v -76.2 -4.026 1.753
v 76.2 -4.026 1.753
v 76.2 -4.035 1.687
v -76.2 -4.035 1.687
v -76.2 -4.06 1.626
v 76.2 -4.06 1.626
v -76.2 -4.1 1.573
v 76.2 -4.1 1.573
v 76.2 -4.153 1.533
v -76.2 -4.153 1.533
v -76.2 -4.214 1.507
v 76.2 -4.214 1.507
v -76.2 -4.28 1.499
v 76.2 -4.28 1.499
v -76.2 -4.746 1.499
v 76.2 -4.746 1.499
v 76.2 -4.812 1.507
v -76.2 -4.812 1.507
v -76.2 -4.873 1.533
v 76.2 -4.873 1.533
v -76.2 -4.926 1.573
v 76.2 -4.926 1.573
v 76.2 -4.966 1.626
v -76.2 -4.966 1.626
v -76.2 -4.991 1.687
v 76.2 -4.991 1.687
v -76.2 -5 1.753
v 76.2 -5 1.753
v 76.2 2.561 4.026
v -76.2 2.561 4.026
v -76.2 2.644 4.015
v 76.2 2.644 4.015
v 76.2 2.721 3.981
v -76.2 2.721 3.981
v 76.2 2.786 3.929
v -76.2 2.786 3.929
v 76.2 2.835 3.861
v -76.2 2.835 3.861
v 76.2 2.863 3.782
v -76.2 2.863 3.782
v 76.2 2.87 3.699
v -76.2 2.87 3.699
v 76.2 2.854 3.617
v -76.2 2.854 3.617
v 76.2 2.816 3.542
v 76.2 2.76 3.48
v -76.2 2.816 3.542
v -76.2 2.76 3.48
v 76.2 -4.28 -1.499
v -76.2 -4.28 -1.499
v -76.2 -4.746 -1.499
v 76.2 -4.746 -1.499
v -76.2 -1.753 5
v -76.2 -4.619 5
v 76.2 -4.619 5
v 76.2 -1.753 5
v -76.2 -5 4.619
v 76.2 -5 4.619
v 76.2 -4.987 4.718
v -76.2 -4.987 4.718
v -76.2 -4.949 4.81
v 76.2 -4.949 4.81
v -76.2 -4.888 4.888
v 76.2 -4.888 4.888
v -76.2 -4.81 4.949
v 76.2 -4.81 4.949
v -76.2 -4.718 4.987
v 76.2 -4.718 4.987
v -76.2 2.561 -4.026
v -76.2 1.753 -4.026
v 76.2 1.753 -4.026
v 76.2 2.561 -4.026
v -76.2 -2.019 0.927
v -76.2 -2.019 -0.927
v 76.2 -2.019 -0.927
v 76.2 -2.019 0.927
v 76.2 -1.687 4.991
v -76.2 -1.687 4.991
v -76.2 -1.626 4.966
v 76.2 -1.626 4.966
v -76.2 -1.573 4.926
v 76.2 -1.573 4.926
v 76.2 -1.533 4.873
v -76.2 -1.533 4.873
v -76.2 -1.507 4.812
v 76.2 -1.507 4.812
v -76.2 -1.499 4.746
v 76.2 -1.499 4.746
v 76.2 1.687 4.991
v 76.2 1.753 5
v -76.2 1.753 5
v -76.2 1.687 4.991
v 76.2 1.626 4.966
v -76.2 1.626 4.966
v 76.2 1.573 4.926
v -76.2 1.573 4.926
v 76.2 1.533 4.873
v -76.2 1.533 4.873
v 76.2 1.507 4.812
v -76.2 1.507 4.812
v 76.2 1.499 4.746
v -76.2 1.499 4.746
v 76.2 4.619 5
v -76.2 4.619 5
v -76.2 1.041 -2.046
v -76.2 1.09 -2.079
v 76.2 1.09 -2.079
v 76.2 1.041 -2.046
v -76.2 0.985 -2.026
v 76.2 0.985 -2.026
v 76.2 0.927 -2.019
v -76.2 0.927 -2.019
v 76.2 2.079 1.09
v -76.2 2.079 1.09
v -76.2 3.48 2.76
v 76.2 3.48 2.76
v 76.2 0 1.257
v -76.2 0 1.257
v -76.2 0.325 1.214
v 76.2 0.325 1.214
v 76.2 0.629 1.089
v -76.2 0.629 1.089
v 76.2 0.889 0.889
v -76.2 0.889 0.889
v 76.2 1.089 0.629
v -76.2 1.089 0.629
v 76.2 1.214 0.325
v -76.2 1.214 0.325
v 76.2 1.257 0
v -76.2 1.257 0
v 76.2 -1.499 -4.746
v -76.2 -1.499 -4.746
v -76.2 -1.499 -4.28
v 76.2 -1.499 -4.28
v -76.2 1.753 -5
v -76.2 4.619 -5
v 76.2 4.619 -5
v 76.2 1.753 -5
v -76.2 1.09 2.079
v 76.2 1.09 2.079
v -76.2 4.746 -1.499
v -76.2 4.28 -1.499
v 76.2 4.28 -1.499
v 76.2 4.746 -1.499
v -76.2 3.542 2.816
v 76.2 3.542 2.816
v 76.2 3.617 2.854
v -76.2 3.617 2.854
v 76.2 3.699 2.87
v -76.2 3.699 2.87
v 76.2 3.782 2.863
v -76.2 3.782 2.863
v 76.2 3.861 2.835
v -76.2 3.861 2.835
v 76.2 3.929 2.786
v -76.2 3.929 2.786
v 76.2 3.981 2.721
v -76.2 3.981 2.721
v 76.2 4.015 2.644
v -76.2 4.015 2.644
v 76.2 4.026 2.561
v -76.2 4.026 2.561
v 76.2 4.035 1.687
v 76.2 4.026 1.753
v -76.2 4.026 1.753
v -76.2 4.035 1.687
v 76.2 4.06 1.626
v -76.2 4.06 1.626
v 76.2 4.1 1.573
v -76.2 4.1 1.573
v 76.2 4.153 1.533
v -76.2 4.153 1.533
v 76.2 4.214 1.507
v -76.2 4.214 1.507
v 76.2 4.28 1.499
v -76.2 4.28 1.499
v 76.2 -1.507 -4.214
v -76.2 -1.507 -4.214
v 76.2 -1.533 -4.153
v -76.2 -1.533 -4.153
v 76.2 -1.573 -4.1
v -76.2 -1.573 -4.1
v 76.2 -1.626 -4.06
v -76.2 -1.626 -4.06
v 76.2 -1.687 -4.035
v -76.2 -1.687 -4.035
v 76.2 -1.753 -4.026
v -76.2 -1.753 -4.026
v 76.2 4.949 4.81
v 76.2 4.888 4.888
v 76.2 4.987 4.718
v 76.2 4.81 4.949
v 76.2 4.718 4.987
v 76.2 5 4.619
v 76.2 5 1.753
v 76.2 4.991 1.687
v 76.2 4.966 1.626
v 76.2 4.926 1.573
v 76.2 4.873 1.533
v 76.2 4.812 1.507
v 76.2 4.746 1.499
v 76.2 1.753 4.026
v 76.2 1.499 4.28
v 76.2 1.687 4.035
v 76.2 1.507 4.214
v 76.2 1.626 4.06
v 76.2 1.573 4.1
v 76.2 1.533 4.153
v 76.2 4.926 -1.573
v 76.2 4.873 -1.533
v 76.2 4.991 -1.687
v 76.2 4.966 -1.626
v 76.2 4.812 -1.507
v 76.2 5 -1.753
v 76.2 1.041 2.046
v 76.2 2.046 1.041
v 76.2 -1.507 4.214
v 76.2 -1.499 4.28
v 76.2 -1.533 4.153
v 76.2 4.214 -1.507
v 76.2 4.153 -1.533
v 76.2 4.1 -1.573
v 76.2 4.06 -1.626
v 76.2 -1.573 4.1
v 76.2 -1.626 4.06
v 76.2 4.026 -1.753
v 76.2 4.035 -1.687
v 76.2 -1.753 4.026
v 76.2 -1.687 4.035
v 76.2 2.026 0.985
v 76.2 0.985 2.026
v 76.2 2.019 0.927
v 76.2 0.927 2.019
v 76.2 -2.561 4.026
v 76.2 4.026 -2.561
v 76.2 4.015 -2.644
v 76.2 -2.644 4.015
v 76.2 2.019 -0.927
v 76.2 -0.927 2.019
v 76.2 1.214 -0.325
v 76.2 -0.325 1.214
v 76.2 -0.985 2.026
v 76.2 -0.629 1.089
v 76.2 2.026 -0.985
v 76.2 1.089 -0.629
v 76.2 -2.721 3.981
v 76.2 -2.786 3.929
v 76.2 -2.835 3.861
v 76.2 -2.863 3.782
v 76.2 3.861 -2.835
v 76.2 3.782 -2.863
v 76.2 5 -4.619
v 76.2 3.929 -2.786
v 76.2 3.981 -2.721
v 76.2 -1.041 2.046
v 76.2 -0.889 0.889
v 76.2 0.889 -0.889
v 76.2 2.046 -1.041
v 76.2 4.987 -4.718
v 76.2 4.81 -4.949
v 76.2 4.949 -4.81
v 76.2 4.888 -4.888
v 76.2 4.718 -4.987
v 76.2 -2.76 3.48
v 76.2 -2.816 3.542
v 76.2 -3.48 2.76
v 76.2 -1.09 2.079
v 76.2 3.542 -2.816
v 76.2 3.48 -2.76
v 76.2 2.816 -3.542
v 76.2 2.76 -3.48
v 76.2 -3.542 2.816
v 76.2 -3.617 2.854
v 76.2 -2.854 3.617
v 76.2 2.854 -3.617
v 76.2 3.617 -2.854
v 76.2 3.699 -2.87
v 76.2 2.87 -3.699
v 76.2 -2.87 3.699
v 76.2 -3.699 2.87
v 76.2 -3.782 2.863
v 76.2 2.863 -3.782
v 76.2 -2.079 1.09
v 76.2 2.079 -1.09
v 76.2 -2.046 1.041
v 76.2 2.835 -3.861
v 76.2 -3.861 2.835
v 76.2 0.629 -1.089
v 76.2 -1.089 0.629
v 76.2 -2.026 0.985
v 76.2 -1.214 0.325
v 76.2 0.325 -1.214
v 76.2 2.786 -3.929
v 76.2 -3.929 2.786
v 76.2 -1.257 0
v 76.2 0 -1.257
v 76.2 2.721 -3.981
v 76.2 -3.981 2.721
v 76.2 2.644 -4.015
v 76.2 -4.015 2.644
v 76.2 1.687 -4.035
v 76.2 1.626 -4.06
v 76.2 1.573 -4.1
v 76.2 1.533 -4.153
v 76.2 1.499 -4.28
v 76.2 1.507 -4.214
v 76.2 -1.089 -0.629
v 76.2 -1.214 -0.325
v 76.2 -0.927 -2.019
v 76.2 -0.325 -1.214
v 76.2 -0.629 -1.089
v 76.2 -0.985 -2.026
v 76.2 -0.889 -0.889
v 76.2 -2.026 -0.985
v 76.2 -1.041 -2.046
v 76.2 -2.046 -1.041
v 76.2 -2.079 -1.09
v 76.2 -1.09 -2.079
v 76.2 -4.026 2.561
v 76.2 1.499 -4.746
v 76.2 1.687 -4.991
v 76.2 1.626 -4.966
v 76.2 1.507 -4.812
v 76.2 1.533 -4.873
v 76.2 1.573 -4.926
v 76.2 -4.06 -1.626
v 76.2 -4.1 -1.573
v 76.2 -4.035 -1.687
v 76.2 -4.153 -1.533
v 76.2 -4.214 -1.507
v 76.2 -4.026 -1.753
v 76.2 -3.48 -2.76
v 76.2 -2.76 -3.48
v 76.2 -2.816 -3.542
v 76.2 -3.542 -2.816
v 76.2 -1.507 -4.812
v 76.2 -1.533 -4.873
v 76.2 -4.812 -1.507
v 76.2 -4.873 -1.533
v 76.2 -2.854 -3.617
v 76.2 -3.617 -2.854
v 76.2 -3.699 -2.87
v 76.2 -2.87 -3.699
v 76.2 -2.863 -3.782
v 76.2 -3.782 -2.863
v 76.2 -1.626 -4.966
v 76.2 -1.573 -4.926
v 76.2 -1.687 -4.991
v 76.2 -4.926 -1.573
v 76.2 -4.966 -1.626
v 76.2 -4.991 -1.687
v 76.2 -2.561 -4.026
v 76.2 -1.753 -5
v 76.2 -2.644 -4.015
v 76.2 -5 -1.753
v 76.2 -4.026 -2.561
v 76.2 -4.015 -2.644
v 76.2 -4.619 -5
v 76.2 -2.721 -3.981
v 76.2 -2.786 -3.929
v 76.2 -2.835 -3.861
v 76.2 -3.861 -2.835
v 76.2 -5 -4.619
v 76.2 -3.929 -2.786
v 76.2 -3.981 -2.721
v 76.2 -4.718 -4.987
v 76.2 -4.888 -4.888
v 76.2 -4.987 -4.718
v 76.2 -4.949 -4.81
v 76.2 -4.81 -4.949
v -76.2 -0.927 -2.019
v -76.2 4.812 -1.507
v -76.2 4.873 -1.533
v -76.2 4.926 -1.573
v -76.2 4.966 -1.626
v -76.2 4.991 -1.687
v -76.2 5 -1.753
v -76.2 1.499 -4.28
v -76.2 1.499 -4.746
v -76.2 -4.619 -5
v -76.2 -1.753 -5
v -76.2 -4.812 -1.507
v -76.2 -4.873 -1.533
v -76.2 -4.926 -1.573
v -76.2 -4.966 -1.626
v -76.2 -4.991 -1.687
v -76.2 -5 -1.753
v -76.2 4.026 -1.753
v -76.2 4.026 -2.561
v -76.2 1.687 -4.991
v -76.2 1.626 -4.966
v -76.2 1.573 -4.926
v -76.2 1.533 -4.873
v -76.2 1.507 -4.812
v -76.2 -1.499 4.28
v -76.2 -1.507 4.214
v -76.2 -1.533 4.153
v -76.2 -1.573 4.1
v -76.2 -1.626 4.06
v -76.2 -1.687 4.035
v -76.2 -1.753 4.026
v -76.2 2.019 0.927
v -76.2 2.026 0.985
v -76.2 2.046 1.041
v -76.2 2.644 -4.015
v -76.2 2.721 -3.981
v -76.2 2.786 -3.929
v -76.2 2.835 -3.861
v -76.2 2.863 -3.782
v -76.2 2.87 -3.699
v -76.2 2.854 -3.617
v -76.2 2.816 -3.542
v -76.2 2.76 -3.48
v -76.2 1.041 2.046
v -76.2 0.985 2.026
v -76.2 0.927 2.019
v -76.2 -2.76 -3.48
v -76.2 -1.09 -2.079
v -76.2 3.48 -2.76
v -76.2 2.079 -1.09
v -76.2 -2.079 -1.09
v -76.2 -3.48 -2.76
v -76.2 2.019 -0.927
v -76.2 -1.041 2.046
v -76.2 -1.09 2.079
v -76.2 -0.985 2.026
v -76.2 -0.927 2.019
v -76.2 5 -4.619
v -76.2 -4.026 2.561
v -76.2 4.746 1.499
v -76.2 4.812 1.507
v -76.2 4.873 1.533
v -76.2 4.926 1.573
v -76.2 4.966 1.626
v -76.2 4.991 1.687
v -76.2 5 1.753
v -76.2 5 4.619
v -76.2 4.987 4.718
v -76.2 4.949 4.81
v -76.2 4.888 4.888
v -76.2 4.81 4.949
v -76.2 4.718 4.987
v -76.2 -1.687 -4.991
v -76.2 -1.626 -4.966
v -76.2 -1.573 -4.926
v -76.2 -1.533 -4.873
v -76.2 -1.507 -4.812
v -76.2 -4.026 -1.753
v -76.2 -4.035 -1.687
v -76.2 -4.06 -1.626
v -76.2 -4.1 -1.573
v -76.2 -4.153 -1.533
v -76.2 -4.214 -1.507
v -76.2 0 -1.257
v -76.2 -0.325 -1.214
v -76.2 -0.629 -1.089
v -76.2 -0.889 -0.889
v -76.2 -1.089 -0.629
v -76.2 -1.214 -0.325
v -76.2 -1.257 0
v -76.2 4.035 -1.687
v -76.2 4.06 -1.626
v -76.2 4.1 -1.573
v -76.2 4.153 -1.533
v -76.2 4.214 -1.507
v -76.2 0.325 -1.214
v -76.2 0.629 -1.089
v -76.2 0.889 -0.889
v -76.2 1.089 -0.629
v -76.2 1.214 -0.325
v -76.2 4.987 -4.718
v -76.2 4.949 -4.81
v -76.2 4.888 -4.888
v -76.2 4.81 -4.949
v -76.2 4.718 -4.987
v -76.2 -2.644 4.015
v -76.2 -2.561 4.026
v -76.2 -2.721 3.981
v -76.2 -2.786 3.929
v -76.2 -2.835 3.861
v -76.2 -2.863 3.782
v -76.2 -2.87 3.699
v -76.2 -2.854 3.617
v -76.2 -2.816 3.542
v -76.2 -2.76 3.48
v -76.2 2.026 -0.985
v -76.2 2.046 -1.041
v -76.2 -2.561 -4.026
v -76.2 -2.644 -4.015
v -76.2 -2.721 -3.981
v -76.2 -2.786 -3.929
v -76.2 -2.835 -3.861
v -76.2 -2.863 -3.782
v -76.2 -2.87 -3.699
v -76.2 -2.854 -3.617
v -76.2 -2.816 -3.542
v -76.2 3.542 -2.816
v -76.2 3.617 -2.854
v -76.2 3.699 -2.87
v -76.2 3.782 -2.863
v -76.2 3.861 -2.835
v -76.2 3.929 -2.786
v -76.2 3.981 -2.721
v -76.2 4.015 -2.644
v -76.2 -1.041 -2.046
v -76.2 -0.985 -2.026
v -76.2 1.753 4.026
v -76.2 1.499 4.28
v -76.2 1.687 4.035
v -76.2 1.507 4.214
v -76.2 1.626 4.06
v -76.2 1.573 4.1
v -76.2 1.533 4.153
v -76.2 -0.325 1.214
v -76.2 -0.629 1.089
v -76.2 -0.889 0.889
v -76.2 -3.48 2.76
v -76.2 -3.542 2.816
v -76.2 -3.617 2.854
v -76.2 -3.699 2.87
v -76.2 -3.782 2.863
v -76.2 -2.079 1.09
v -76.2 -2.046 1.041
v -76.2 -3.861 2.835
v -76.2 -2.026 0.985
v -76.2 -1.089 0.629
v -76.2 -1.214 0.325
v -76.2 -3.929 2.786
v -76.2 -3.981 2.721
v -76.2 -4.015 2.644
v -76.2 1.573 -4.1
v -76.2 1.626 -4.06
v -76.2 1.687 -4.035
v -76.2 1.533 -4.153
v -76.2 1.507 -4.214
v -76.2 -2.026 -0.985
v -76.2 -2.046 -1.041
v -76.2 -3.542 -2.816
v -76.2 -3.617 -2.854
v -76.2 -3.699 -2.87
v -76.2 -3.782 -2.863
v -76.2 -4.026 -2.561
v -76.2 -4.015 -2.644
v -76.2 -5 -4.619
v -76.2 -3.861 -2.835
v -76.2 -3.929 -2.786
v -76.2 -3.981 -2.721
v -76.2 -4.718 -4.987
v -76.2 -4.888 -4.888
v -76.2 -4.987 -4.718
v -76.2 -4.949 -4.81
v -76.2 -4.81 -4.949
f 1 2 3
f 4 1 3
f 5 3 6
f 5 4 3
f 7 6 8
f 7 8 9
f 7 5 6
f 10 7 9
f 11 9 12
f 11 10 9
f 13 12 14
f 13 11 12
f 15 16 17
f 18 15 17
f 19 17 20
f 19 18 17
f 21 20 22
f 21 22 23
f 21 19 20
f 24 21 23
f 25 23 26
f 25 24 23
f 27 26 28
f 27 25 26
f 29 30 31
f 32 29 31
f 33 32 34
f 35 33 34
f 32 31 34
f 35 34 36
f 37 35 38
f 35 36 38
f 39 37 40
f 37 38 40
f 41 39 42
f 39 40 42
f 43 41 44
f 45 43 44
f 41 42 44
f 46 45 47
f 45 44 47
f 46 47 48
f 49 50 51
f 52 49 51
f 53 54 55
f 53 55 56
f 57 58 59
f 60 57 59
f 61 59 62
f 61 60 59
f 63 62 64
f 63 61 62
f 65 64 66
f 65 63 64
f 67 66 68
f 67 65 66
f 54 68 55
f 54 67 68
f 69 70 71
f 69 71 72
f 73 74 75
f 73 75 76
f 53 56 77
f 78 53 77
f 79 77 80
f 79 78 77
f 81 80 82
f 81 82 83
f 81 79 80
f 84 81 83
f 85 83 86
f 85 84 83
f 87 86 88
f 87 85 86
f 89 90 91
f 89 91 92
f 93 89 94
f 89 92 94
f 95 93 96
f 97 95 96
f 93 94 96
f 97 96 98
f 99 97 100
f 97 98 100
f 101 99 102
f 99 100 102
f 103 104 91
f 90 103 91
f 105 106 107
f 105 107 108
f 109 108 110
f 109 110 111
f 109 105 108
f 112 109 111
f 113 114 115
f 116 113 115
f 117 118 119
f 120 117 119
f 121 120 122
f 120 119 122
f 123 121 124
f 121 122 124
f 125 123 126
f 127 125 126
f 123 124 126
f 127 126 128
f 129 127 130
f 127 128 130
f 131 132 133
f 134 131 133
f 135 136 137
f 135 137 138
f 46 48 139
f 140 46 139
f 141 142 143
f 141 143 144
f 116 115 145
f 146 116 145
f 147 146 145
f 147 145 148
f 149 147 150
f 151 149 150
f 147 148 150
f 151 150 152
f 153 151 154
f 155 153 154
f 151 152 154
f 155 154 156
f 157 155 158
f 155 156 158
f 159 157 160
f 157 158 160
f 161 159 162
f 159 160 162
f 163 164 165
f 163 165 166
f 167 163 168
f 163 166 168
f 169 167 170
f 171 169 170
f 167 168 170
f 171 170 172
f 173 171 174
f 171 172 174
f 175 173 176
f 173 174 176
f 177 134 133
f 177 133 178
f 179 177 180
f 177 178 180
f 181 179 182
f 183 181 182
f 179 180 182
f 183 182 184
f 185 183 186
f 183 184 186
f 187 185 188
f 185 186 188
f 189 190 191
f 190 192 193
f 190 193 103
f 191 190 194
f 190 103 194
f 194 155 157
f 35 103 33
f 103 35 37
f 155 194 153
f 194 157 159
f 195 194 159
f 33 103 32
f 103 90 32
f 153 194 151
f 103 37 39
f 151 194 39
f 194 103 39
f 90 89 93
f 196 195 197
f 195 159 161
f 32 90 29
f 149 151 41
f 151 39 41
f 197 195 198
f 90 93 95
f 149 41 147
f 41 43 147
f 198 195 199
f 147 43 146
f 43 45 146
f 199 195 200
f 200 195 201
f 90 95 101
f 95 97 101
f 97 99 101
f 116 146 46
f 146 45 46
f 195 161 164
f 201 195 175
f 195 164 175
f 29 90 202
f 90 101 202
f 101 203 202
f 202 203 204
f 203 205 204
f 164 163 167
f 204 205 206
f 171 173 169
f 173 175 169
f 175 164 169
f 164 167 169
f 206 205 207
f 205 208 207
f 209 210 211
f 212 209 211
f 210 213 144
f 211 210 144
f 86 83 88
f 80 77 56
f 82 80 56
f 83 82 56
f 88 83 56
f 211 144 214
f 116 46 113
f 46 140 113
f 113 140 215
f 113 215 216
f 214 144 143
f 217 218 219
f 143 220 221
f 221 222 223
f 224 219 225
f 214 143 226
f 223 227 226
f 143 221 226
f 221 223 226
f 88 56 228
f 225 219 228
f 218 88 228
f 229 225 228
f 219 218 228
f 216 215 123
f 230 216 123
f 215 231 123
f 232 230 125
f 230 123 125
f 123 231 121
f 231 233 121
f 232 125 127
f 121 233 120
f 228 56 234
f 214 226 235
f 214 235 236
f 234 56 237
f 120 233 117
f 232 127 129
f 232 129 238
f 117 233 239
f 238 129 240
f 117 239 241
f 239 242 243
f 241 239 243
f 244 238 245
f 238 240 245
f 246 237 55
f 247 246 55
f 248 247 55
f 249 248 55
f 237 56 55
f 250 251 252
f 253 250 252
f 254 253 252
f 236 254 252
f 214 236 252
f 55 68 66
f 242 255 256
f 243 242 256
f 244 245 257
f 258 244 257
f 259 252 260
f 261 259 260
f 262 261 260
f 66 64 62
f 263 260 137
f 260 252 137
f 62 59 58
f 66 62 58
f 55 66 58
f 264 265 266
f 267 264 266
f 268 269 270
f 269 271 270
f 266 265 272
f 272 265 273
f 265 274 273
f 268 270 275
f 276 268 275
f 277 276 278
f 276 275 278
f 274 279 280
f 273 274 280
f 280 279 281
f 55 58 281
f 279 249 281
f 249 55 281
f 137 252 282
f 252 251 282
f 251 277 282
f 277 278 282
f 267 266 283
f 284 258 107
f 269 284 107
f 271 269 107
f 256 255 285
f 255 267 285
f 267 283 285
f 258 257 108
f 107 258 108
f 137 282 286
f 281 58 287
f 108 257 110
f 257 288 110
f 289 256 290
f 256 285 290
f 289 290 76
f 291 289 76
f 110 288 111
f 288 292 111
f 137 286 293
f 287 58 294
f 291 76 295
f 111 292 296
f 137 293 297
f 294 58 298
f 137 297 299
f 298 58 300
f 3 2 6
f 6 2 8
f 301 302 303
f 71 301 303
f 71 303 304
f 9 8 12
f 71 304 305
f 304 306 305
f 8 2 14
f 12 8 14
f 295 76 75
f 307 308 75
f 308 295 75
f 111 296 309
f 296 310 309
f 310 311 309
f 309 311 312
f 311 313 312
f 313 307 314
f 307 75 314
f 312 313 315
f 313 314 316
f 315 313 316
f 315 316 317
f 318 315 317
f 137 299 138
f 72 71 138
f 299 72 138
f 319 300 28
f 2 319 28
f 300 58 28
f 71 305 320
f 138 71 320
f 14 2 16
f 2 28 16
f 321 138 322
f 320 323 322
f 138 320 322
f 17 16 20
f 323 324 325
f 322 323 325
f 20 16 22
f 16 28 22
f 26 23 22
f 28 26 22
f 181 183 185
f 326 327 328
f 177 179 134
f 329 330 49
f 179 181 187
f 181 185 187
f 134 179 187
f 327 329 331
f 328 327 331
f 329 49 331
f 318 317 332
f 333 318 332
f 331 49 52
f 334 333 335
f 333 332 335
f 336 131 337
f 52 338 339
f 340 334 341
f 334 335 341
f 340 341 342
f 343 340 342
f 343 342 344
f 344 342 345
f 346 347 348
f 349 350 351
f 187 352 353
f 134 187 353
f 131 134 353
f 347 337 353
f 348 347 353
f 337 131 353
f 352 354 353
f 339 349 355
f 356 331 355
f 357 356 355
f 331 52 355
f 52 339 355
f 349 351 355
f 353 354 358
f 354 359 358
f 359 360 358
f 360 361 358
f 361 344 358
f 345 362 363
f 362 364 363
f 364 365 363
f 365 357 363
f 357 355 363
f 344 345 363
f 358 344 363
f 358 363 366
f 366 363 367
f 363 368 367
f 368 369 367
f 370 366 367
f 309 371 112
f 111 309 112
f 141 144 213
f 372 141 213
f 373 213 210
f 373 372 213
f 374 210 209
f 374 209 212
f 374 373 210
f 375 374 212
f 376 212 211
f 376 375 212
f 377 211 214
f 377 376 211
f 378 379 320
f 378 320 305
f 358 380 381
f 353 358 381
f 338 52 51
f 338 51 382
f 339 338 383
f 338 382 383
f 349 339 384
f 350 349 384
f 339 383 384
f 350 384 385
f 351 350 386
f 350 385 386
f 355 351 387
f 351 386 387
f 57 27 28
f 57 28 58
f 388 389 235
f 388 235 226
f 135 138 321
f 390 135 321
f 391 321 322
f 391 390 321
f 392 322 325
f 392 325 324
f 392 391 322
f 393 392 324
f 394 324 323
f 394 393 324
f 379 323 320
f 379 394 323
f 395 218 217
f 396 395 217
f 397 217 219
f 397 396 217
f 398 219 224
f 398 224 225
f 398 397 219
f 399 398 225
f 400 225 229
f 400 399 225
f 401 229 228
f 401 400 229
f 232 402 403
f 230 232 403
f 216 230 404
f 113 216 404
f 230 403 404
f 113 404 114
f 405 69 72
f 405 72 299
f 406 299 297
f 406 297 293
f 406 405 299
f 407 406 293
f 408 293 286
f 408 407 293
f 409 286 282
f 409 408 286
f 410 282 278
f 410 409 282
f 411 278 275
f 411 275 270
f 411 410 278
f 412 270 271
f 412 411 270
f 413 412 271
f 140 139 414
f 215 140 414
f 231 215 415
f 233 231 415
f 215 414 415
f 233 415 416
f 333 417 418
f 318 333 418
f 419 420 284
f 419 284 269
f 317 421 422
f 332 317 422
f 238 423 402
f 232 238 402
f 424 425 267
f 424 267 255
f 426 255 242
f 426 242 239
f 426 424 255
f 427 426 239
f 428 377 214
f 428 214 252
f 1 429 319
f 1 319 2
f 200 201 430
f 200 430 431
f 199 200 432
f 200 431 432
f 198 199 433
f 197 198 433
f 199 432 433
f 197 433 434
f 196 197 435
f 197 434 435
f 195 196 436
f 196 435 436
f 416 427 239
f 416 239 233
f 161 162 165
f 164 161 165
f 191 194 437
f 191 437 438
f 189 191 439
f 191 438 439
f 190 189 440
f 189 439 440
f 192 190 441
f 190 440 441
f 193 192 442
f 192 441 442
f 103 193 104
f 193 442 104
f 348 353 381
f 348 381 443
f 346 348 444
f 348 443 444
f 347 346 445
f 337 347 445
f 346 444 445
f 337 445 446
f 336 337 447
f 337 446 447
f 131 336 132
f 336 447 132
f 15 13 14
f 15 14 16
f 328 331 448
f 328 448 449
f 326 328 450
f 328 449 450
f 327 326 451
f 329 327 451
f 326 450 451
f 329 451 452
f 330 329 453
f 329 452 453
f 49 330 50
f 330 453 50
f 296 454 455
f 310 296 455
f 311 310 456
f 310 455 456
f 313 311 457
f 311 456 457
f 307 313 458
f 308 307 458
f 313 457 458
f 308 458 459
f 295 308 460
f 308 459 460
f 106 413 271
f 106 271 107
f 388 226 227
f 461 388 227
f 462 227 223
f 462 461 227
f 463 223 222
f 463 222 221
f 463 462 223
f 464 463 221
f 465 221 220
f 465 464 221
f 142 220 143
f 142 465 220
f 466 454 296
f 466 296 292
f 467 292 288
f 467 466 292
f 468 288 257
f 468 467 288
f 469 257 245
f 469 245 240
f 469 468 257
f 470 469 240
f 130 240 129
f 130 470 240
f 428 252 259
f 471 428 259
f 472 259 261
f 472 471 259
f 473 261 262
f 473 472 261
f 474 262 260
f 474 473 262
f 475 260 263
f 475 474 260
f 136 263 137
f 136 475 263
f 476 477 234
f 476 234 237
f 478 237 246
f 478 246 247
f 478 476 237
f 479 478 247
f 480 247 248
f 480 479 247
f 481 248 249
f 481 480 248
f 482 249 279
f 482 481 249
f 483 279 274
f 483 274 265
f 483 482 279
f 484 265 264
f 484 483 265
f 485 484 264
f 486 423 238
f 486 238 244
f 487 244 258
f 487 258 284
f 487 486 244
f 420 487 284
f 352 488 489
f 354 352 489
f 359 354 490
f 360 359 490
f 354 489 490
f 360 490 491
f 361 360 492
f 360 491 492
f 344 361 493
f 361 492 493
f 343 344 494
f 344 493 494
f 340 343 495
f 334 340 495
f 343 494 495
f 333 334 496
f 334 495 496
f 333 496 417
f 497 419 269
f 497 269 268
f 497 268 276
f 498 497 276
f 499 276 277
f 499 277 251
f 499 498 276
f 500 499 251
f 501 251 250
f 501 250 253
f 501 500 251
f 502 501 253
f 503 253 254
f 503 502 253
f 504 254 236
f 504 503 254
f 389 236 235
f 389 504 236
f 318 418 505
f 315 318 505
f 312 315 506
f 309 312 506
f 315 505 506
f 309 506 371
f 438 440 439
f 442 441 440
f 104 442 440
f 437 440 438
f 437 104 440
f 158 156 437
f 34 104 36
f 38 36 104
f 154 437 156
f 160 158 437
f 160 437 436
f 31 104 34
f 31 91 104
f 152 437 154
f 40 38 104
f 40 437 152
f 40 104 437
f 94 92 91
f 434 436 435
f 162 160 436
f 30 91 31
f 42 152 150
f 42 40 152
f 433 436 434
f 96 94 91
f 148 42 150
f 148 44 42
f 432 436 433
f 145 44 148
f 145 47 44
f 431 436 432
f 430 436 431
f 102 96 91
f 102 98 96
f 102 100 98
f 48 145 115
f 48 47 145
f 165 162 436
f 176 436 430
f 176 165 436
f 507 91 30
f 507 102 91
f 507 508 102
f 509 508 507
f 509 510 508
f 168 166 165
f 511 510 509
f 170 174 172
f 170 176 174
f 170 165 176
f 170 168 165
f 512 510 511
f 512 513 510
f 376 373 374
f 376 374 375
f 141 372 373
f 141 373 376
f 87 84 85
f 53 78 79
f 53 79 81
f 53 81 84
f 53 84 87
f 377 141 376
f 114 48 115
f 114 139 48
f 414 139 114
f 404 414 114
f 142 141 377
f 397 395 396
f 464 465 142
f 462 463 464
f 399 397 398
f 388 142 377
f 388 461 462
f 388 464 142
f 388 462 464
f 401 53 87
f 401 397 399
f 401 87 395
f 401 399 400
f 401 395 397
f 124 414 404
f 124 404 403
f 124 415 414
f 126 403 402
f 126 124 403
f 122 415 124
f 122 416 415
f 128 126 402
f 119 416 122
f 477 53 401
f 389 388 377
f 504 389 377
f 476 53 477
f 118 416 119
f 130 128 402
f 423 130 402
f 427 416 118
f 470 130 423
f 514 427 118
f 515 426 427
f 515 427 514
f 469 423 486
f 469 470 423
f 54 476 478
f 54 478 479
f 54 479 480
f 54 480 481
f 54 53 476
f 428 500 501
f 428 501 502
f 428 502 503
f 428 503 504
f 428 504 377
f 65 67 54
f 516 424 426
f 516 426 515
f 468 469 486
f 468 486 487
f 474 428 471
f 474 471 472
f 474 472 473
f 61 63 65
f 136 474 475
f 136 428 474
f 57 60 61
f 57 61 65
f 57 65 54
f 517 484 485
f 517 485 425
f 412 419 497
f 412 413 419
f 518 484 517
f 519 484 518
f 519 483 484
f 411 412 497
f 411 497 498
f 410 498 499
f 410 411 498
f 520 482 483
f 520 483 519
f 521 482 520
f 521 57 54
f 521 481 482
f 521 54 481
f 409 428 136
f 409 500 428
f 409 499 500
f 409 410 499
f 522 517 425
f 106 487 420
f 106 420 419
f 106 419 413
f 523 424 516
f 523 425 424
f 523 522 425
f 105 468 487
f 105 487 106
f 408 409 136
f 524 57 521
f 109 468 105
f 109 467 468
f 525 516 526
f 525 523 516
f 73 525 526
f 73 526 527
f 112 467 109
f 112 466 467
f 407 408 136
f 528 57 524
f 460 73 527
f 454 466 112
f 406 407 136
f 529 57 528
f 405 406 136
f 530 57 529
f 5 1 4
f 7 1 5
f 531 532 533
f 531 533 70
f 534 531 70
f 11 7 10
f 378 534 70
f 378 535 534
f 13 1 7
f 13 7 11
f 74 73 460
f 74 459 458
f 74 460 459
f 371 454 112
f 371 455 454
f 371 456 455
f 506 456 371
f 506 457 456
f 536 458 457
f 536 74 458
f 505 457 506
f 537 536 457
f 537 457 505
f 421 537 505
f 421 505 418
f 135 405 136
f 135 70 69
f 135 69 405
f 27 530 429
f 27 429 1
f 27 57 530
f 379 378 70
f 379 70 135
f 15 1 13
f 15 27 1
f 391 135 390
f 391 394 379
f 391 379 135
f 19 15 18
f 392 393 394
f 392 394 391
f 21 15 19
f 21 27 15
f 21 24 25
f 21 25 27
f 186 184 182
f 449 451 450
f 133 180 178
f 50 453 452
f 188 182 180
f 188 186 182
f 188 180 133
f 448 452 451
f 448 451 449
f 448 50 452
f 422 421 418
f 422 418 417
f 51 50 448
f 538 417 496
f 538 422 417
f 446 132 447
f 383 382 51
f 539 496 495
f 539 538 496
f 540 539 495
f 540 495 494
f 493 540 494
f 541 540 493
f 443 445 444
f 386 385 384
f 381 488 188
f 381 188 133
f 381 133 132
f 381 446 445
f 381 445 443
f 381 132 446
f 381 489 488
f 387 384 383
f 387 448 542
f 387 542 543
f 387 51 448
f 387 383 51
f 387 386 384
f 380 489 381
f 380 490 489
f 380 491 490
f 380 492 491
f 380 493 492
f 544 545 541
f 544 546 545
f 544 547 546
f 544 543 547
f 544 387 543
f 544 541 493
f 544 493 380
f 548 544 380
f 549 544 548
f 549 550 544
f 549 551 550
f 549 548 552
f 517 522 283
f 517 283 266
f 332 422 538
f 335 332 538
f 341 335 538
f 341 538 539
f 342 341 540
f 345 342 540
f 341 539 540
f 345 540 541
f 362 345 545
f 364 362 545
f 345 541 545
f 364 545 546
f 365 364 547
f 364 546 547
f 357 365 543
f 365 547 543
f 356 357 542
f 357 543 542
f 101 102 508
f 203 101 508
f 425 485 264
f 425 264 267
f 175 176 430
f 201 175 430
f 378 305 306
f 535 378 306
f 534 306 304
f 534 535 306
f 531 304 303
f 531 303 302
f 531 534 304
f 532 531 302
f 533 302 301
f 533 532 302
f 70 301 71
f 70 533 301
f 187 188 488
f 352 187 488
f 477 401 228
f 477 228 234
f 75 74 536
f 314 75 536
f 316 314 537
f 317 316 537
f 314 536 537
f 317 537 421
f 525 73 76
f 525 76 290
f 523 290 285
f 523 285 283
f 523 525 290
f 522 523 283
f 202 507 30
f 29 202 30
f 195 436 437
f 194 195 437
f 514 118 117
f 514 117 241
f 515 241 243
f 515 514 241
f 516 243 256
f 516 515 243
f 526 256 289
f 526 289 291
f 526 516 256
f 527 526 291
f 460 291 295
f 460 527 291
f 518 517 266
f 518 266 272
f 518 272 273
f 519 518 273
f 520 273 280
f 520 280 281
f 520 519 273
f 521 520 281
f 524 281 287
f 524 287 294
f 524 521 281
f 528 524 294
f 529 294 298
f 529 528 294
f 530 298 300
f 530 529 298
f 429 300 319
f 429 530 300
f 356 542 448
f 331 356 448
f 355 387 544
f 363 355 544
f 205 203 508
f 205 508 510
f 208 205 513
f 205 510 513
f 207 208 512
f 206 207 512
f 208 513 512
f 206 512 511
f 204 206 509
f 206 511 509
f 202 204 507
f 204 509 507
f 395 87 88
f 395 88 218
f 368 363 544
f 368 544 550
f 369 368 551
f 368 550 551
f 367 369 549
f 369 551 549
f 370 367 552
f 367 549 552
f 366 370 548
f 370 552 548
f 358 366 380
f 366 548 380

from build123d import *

# Parameters (mm, degrees)
BOSS_EXTRUDE1_START = -76.2
BOSS_EXTRUDE1_DEPTH = 152.4


with BuildPart() as part:
    # Sketch4 → Boss-Extrude1 (new body)
    with BuildSketch(Plane(origin=(0, 0, 0), x_dir=(0, 0, -1), z_dir=(1, 0, 0)).offset(BOSS_EXTRUDE1_START)):
        with BuildLine():
            Line((0, 1.2573), (0, 2.0193))
            Line((0, 2.0193), (0.92659956, 2.0193))
            ThreePointArc((0.92659956, 2.0193), (1.013472677, 2.034618074), (1.089867613, 2.078724711))
            Line((1.089867613, 2.078724711), (2.759770219, 3.479939372))
            ThreePointArc((2.759770219, 3.479939372), (2.851556384, 3.822490003), (2.561056801, 4.0259))
            Line((2.561056801, 4.0259), (1.7526, 4.0259))
            ThreePointArc((1.7526, 4.0259), (1.572994878, 4.100294878), (1.4986, 4.2799))
            Line((1.4986, 4.2799), (1.4986, 4.746))
            ThreePointArc((1.4986, 4.746), (1.572994878, 4.925605122), (1.7526, 5))
            Line((1.7526, 5), (4.619, 5))
            ThreePointArc((4.619, 5), (4.888407684, 4.888407684), (5, 4.619))
            Line((5, 4.619), (5, 1.7526))
            ThreePointArc((5, 1.7526), (4.925605122, 1.572994878), (4.746, 1.4986))
            Line((4.746, 1.4986), (4.2799, 1.4986))
            ThreePointArc((4.2799, 1.4986), (4.100294878, 1.572994878), (4.0259, 1.7526))
            Line((4.0259, 1.7526), (4.0259, 2.561056801))
            ThreePointArc((4.0259, 2.561056801), (3.822490003, 2.851556384), (3.479939372, 2.759770219))
            Line((3.479939372, 2.759770219), (2.078724711, 1.089867613))
            ThreePointArc((2.078724711, 1.089867613), (2.034618074, 1.013472677), (2.0193, 0.92659956))
            Line((2.0193, 0.92659956), (2.0193, 0))
            Line((2.0193, 0), (1.2573, 0))
            ThreePointArc((1.2573, 0), (0.889045356, 0.889045356), (0, 1.2573))
        make_face()
    extrude(amount=BOSS_EXTRUDE1_DEPTH)

    # Mirror1: part across plane


with BuildPart() as part_1:
    add(part.part)
    add(part.part.mirror(Plane.ZX))

    # Mirror2: part across plane


with BuildPart() as part_2:
    add(part_1.part)
    add(part_1.part.mirror(Plane.XY))


solid = part_2.part
